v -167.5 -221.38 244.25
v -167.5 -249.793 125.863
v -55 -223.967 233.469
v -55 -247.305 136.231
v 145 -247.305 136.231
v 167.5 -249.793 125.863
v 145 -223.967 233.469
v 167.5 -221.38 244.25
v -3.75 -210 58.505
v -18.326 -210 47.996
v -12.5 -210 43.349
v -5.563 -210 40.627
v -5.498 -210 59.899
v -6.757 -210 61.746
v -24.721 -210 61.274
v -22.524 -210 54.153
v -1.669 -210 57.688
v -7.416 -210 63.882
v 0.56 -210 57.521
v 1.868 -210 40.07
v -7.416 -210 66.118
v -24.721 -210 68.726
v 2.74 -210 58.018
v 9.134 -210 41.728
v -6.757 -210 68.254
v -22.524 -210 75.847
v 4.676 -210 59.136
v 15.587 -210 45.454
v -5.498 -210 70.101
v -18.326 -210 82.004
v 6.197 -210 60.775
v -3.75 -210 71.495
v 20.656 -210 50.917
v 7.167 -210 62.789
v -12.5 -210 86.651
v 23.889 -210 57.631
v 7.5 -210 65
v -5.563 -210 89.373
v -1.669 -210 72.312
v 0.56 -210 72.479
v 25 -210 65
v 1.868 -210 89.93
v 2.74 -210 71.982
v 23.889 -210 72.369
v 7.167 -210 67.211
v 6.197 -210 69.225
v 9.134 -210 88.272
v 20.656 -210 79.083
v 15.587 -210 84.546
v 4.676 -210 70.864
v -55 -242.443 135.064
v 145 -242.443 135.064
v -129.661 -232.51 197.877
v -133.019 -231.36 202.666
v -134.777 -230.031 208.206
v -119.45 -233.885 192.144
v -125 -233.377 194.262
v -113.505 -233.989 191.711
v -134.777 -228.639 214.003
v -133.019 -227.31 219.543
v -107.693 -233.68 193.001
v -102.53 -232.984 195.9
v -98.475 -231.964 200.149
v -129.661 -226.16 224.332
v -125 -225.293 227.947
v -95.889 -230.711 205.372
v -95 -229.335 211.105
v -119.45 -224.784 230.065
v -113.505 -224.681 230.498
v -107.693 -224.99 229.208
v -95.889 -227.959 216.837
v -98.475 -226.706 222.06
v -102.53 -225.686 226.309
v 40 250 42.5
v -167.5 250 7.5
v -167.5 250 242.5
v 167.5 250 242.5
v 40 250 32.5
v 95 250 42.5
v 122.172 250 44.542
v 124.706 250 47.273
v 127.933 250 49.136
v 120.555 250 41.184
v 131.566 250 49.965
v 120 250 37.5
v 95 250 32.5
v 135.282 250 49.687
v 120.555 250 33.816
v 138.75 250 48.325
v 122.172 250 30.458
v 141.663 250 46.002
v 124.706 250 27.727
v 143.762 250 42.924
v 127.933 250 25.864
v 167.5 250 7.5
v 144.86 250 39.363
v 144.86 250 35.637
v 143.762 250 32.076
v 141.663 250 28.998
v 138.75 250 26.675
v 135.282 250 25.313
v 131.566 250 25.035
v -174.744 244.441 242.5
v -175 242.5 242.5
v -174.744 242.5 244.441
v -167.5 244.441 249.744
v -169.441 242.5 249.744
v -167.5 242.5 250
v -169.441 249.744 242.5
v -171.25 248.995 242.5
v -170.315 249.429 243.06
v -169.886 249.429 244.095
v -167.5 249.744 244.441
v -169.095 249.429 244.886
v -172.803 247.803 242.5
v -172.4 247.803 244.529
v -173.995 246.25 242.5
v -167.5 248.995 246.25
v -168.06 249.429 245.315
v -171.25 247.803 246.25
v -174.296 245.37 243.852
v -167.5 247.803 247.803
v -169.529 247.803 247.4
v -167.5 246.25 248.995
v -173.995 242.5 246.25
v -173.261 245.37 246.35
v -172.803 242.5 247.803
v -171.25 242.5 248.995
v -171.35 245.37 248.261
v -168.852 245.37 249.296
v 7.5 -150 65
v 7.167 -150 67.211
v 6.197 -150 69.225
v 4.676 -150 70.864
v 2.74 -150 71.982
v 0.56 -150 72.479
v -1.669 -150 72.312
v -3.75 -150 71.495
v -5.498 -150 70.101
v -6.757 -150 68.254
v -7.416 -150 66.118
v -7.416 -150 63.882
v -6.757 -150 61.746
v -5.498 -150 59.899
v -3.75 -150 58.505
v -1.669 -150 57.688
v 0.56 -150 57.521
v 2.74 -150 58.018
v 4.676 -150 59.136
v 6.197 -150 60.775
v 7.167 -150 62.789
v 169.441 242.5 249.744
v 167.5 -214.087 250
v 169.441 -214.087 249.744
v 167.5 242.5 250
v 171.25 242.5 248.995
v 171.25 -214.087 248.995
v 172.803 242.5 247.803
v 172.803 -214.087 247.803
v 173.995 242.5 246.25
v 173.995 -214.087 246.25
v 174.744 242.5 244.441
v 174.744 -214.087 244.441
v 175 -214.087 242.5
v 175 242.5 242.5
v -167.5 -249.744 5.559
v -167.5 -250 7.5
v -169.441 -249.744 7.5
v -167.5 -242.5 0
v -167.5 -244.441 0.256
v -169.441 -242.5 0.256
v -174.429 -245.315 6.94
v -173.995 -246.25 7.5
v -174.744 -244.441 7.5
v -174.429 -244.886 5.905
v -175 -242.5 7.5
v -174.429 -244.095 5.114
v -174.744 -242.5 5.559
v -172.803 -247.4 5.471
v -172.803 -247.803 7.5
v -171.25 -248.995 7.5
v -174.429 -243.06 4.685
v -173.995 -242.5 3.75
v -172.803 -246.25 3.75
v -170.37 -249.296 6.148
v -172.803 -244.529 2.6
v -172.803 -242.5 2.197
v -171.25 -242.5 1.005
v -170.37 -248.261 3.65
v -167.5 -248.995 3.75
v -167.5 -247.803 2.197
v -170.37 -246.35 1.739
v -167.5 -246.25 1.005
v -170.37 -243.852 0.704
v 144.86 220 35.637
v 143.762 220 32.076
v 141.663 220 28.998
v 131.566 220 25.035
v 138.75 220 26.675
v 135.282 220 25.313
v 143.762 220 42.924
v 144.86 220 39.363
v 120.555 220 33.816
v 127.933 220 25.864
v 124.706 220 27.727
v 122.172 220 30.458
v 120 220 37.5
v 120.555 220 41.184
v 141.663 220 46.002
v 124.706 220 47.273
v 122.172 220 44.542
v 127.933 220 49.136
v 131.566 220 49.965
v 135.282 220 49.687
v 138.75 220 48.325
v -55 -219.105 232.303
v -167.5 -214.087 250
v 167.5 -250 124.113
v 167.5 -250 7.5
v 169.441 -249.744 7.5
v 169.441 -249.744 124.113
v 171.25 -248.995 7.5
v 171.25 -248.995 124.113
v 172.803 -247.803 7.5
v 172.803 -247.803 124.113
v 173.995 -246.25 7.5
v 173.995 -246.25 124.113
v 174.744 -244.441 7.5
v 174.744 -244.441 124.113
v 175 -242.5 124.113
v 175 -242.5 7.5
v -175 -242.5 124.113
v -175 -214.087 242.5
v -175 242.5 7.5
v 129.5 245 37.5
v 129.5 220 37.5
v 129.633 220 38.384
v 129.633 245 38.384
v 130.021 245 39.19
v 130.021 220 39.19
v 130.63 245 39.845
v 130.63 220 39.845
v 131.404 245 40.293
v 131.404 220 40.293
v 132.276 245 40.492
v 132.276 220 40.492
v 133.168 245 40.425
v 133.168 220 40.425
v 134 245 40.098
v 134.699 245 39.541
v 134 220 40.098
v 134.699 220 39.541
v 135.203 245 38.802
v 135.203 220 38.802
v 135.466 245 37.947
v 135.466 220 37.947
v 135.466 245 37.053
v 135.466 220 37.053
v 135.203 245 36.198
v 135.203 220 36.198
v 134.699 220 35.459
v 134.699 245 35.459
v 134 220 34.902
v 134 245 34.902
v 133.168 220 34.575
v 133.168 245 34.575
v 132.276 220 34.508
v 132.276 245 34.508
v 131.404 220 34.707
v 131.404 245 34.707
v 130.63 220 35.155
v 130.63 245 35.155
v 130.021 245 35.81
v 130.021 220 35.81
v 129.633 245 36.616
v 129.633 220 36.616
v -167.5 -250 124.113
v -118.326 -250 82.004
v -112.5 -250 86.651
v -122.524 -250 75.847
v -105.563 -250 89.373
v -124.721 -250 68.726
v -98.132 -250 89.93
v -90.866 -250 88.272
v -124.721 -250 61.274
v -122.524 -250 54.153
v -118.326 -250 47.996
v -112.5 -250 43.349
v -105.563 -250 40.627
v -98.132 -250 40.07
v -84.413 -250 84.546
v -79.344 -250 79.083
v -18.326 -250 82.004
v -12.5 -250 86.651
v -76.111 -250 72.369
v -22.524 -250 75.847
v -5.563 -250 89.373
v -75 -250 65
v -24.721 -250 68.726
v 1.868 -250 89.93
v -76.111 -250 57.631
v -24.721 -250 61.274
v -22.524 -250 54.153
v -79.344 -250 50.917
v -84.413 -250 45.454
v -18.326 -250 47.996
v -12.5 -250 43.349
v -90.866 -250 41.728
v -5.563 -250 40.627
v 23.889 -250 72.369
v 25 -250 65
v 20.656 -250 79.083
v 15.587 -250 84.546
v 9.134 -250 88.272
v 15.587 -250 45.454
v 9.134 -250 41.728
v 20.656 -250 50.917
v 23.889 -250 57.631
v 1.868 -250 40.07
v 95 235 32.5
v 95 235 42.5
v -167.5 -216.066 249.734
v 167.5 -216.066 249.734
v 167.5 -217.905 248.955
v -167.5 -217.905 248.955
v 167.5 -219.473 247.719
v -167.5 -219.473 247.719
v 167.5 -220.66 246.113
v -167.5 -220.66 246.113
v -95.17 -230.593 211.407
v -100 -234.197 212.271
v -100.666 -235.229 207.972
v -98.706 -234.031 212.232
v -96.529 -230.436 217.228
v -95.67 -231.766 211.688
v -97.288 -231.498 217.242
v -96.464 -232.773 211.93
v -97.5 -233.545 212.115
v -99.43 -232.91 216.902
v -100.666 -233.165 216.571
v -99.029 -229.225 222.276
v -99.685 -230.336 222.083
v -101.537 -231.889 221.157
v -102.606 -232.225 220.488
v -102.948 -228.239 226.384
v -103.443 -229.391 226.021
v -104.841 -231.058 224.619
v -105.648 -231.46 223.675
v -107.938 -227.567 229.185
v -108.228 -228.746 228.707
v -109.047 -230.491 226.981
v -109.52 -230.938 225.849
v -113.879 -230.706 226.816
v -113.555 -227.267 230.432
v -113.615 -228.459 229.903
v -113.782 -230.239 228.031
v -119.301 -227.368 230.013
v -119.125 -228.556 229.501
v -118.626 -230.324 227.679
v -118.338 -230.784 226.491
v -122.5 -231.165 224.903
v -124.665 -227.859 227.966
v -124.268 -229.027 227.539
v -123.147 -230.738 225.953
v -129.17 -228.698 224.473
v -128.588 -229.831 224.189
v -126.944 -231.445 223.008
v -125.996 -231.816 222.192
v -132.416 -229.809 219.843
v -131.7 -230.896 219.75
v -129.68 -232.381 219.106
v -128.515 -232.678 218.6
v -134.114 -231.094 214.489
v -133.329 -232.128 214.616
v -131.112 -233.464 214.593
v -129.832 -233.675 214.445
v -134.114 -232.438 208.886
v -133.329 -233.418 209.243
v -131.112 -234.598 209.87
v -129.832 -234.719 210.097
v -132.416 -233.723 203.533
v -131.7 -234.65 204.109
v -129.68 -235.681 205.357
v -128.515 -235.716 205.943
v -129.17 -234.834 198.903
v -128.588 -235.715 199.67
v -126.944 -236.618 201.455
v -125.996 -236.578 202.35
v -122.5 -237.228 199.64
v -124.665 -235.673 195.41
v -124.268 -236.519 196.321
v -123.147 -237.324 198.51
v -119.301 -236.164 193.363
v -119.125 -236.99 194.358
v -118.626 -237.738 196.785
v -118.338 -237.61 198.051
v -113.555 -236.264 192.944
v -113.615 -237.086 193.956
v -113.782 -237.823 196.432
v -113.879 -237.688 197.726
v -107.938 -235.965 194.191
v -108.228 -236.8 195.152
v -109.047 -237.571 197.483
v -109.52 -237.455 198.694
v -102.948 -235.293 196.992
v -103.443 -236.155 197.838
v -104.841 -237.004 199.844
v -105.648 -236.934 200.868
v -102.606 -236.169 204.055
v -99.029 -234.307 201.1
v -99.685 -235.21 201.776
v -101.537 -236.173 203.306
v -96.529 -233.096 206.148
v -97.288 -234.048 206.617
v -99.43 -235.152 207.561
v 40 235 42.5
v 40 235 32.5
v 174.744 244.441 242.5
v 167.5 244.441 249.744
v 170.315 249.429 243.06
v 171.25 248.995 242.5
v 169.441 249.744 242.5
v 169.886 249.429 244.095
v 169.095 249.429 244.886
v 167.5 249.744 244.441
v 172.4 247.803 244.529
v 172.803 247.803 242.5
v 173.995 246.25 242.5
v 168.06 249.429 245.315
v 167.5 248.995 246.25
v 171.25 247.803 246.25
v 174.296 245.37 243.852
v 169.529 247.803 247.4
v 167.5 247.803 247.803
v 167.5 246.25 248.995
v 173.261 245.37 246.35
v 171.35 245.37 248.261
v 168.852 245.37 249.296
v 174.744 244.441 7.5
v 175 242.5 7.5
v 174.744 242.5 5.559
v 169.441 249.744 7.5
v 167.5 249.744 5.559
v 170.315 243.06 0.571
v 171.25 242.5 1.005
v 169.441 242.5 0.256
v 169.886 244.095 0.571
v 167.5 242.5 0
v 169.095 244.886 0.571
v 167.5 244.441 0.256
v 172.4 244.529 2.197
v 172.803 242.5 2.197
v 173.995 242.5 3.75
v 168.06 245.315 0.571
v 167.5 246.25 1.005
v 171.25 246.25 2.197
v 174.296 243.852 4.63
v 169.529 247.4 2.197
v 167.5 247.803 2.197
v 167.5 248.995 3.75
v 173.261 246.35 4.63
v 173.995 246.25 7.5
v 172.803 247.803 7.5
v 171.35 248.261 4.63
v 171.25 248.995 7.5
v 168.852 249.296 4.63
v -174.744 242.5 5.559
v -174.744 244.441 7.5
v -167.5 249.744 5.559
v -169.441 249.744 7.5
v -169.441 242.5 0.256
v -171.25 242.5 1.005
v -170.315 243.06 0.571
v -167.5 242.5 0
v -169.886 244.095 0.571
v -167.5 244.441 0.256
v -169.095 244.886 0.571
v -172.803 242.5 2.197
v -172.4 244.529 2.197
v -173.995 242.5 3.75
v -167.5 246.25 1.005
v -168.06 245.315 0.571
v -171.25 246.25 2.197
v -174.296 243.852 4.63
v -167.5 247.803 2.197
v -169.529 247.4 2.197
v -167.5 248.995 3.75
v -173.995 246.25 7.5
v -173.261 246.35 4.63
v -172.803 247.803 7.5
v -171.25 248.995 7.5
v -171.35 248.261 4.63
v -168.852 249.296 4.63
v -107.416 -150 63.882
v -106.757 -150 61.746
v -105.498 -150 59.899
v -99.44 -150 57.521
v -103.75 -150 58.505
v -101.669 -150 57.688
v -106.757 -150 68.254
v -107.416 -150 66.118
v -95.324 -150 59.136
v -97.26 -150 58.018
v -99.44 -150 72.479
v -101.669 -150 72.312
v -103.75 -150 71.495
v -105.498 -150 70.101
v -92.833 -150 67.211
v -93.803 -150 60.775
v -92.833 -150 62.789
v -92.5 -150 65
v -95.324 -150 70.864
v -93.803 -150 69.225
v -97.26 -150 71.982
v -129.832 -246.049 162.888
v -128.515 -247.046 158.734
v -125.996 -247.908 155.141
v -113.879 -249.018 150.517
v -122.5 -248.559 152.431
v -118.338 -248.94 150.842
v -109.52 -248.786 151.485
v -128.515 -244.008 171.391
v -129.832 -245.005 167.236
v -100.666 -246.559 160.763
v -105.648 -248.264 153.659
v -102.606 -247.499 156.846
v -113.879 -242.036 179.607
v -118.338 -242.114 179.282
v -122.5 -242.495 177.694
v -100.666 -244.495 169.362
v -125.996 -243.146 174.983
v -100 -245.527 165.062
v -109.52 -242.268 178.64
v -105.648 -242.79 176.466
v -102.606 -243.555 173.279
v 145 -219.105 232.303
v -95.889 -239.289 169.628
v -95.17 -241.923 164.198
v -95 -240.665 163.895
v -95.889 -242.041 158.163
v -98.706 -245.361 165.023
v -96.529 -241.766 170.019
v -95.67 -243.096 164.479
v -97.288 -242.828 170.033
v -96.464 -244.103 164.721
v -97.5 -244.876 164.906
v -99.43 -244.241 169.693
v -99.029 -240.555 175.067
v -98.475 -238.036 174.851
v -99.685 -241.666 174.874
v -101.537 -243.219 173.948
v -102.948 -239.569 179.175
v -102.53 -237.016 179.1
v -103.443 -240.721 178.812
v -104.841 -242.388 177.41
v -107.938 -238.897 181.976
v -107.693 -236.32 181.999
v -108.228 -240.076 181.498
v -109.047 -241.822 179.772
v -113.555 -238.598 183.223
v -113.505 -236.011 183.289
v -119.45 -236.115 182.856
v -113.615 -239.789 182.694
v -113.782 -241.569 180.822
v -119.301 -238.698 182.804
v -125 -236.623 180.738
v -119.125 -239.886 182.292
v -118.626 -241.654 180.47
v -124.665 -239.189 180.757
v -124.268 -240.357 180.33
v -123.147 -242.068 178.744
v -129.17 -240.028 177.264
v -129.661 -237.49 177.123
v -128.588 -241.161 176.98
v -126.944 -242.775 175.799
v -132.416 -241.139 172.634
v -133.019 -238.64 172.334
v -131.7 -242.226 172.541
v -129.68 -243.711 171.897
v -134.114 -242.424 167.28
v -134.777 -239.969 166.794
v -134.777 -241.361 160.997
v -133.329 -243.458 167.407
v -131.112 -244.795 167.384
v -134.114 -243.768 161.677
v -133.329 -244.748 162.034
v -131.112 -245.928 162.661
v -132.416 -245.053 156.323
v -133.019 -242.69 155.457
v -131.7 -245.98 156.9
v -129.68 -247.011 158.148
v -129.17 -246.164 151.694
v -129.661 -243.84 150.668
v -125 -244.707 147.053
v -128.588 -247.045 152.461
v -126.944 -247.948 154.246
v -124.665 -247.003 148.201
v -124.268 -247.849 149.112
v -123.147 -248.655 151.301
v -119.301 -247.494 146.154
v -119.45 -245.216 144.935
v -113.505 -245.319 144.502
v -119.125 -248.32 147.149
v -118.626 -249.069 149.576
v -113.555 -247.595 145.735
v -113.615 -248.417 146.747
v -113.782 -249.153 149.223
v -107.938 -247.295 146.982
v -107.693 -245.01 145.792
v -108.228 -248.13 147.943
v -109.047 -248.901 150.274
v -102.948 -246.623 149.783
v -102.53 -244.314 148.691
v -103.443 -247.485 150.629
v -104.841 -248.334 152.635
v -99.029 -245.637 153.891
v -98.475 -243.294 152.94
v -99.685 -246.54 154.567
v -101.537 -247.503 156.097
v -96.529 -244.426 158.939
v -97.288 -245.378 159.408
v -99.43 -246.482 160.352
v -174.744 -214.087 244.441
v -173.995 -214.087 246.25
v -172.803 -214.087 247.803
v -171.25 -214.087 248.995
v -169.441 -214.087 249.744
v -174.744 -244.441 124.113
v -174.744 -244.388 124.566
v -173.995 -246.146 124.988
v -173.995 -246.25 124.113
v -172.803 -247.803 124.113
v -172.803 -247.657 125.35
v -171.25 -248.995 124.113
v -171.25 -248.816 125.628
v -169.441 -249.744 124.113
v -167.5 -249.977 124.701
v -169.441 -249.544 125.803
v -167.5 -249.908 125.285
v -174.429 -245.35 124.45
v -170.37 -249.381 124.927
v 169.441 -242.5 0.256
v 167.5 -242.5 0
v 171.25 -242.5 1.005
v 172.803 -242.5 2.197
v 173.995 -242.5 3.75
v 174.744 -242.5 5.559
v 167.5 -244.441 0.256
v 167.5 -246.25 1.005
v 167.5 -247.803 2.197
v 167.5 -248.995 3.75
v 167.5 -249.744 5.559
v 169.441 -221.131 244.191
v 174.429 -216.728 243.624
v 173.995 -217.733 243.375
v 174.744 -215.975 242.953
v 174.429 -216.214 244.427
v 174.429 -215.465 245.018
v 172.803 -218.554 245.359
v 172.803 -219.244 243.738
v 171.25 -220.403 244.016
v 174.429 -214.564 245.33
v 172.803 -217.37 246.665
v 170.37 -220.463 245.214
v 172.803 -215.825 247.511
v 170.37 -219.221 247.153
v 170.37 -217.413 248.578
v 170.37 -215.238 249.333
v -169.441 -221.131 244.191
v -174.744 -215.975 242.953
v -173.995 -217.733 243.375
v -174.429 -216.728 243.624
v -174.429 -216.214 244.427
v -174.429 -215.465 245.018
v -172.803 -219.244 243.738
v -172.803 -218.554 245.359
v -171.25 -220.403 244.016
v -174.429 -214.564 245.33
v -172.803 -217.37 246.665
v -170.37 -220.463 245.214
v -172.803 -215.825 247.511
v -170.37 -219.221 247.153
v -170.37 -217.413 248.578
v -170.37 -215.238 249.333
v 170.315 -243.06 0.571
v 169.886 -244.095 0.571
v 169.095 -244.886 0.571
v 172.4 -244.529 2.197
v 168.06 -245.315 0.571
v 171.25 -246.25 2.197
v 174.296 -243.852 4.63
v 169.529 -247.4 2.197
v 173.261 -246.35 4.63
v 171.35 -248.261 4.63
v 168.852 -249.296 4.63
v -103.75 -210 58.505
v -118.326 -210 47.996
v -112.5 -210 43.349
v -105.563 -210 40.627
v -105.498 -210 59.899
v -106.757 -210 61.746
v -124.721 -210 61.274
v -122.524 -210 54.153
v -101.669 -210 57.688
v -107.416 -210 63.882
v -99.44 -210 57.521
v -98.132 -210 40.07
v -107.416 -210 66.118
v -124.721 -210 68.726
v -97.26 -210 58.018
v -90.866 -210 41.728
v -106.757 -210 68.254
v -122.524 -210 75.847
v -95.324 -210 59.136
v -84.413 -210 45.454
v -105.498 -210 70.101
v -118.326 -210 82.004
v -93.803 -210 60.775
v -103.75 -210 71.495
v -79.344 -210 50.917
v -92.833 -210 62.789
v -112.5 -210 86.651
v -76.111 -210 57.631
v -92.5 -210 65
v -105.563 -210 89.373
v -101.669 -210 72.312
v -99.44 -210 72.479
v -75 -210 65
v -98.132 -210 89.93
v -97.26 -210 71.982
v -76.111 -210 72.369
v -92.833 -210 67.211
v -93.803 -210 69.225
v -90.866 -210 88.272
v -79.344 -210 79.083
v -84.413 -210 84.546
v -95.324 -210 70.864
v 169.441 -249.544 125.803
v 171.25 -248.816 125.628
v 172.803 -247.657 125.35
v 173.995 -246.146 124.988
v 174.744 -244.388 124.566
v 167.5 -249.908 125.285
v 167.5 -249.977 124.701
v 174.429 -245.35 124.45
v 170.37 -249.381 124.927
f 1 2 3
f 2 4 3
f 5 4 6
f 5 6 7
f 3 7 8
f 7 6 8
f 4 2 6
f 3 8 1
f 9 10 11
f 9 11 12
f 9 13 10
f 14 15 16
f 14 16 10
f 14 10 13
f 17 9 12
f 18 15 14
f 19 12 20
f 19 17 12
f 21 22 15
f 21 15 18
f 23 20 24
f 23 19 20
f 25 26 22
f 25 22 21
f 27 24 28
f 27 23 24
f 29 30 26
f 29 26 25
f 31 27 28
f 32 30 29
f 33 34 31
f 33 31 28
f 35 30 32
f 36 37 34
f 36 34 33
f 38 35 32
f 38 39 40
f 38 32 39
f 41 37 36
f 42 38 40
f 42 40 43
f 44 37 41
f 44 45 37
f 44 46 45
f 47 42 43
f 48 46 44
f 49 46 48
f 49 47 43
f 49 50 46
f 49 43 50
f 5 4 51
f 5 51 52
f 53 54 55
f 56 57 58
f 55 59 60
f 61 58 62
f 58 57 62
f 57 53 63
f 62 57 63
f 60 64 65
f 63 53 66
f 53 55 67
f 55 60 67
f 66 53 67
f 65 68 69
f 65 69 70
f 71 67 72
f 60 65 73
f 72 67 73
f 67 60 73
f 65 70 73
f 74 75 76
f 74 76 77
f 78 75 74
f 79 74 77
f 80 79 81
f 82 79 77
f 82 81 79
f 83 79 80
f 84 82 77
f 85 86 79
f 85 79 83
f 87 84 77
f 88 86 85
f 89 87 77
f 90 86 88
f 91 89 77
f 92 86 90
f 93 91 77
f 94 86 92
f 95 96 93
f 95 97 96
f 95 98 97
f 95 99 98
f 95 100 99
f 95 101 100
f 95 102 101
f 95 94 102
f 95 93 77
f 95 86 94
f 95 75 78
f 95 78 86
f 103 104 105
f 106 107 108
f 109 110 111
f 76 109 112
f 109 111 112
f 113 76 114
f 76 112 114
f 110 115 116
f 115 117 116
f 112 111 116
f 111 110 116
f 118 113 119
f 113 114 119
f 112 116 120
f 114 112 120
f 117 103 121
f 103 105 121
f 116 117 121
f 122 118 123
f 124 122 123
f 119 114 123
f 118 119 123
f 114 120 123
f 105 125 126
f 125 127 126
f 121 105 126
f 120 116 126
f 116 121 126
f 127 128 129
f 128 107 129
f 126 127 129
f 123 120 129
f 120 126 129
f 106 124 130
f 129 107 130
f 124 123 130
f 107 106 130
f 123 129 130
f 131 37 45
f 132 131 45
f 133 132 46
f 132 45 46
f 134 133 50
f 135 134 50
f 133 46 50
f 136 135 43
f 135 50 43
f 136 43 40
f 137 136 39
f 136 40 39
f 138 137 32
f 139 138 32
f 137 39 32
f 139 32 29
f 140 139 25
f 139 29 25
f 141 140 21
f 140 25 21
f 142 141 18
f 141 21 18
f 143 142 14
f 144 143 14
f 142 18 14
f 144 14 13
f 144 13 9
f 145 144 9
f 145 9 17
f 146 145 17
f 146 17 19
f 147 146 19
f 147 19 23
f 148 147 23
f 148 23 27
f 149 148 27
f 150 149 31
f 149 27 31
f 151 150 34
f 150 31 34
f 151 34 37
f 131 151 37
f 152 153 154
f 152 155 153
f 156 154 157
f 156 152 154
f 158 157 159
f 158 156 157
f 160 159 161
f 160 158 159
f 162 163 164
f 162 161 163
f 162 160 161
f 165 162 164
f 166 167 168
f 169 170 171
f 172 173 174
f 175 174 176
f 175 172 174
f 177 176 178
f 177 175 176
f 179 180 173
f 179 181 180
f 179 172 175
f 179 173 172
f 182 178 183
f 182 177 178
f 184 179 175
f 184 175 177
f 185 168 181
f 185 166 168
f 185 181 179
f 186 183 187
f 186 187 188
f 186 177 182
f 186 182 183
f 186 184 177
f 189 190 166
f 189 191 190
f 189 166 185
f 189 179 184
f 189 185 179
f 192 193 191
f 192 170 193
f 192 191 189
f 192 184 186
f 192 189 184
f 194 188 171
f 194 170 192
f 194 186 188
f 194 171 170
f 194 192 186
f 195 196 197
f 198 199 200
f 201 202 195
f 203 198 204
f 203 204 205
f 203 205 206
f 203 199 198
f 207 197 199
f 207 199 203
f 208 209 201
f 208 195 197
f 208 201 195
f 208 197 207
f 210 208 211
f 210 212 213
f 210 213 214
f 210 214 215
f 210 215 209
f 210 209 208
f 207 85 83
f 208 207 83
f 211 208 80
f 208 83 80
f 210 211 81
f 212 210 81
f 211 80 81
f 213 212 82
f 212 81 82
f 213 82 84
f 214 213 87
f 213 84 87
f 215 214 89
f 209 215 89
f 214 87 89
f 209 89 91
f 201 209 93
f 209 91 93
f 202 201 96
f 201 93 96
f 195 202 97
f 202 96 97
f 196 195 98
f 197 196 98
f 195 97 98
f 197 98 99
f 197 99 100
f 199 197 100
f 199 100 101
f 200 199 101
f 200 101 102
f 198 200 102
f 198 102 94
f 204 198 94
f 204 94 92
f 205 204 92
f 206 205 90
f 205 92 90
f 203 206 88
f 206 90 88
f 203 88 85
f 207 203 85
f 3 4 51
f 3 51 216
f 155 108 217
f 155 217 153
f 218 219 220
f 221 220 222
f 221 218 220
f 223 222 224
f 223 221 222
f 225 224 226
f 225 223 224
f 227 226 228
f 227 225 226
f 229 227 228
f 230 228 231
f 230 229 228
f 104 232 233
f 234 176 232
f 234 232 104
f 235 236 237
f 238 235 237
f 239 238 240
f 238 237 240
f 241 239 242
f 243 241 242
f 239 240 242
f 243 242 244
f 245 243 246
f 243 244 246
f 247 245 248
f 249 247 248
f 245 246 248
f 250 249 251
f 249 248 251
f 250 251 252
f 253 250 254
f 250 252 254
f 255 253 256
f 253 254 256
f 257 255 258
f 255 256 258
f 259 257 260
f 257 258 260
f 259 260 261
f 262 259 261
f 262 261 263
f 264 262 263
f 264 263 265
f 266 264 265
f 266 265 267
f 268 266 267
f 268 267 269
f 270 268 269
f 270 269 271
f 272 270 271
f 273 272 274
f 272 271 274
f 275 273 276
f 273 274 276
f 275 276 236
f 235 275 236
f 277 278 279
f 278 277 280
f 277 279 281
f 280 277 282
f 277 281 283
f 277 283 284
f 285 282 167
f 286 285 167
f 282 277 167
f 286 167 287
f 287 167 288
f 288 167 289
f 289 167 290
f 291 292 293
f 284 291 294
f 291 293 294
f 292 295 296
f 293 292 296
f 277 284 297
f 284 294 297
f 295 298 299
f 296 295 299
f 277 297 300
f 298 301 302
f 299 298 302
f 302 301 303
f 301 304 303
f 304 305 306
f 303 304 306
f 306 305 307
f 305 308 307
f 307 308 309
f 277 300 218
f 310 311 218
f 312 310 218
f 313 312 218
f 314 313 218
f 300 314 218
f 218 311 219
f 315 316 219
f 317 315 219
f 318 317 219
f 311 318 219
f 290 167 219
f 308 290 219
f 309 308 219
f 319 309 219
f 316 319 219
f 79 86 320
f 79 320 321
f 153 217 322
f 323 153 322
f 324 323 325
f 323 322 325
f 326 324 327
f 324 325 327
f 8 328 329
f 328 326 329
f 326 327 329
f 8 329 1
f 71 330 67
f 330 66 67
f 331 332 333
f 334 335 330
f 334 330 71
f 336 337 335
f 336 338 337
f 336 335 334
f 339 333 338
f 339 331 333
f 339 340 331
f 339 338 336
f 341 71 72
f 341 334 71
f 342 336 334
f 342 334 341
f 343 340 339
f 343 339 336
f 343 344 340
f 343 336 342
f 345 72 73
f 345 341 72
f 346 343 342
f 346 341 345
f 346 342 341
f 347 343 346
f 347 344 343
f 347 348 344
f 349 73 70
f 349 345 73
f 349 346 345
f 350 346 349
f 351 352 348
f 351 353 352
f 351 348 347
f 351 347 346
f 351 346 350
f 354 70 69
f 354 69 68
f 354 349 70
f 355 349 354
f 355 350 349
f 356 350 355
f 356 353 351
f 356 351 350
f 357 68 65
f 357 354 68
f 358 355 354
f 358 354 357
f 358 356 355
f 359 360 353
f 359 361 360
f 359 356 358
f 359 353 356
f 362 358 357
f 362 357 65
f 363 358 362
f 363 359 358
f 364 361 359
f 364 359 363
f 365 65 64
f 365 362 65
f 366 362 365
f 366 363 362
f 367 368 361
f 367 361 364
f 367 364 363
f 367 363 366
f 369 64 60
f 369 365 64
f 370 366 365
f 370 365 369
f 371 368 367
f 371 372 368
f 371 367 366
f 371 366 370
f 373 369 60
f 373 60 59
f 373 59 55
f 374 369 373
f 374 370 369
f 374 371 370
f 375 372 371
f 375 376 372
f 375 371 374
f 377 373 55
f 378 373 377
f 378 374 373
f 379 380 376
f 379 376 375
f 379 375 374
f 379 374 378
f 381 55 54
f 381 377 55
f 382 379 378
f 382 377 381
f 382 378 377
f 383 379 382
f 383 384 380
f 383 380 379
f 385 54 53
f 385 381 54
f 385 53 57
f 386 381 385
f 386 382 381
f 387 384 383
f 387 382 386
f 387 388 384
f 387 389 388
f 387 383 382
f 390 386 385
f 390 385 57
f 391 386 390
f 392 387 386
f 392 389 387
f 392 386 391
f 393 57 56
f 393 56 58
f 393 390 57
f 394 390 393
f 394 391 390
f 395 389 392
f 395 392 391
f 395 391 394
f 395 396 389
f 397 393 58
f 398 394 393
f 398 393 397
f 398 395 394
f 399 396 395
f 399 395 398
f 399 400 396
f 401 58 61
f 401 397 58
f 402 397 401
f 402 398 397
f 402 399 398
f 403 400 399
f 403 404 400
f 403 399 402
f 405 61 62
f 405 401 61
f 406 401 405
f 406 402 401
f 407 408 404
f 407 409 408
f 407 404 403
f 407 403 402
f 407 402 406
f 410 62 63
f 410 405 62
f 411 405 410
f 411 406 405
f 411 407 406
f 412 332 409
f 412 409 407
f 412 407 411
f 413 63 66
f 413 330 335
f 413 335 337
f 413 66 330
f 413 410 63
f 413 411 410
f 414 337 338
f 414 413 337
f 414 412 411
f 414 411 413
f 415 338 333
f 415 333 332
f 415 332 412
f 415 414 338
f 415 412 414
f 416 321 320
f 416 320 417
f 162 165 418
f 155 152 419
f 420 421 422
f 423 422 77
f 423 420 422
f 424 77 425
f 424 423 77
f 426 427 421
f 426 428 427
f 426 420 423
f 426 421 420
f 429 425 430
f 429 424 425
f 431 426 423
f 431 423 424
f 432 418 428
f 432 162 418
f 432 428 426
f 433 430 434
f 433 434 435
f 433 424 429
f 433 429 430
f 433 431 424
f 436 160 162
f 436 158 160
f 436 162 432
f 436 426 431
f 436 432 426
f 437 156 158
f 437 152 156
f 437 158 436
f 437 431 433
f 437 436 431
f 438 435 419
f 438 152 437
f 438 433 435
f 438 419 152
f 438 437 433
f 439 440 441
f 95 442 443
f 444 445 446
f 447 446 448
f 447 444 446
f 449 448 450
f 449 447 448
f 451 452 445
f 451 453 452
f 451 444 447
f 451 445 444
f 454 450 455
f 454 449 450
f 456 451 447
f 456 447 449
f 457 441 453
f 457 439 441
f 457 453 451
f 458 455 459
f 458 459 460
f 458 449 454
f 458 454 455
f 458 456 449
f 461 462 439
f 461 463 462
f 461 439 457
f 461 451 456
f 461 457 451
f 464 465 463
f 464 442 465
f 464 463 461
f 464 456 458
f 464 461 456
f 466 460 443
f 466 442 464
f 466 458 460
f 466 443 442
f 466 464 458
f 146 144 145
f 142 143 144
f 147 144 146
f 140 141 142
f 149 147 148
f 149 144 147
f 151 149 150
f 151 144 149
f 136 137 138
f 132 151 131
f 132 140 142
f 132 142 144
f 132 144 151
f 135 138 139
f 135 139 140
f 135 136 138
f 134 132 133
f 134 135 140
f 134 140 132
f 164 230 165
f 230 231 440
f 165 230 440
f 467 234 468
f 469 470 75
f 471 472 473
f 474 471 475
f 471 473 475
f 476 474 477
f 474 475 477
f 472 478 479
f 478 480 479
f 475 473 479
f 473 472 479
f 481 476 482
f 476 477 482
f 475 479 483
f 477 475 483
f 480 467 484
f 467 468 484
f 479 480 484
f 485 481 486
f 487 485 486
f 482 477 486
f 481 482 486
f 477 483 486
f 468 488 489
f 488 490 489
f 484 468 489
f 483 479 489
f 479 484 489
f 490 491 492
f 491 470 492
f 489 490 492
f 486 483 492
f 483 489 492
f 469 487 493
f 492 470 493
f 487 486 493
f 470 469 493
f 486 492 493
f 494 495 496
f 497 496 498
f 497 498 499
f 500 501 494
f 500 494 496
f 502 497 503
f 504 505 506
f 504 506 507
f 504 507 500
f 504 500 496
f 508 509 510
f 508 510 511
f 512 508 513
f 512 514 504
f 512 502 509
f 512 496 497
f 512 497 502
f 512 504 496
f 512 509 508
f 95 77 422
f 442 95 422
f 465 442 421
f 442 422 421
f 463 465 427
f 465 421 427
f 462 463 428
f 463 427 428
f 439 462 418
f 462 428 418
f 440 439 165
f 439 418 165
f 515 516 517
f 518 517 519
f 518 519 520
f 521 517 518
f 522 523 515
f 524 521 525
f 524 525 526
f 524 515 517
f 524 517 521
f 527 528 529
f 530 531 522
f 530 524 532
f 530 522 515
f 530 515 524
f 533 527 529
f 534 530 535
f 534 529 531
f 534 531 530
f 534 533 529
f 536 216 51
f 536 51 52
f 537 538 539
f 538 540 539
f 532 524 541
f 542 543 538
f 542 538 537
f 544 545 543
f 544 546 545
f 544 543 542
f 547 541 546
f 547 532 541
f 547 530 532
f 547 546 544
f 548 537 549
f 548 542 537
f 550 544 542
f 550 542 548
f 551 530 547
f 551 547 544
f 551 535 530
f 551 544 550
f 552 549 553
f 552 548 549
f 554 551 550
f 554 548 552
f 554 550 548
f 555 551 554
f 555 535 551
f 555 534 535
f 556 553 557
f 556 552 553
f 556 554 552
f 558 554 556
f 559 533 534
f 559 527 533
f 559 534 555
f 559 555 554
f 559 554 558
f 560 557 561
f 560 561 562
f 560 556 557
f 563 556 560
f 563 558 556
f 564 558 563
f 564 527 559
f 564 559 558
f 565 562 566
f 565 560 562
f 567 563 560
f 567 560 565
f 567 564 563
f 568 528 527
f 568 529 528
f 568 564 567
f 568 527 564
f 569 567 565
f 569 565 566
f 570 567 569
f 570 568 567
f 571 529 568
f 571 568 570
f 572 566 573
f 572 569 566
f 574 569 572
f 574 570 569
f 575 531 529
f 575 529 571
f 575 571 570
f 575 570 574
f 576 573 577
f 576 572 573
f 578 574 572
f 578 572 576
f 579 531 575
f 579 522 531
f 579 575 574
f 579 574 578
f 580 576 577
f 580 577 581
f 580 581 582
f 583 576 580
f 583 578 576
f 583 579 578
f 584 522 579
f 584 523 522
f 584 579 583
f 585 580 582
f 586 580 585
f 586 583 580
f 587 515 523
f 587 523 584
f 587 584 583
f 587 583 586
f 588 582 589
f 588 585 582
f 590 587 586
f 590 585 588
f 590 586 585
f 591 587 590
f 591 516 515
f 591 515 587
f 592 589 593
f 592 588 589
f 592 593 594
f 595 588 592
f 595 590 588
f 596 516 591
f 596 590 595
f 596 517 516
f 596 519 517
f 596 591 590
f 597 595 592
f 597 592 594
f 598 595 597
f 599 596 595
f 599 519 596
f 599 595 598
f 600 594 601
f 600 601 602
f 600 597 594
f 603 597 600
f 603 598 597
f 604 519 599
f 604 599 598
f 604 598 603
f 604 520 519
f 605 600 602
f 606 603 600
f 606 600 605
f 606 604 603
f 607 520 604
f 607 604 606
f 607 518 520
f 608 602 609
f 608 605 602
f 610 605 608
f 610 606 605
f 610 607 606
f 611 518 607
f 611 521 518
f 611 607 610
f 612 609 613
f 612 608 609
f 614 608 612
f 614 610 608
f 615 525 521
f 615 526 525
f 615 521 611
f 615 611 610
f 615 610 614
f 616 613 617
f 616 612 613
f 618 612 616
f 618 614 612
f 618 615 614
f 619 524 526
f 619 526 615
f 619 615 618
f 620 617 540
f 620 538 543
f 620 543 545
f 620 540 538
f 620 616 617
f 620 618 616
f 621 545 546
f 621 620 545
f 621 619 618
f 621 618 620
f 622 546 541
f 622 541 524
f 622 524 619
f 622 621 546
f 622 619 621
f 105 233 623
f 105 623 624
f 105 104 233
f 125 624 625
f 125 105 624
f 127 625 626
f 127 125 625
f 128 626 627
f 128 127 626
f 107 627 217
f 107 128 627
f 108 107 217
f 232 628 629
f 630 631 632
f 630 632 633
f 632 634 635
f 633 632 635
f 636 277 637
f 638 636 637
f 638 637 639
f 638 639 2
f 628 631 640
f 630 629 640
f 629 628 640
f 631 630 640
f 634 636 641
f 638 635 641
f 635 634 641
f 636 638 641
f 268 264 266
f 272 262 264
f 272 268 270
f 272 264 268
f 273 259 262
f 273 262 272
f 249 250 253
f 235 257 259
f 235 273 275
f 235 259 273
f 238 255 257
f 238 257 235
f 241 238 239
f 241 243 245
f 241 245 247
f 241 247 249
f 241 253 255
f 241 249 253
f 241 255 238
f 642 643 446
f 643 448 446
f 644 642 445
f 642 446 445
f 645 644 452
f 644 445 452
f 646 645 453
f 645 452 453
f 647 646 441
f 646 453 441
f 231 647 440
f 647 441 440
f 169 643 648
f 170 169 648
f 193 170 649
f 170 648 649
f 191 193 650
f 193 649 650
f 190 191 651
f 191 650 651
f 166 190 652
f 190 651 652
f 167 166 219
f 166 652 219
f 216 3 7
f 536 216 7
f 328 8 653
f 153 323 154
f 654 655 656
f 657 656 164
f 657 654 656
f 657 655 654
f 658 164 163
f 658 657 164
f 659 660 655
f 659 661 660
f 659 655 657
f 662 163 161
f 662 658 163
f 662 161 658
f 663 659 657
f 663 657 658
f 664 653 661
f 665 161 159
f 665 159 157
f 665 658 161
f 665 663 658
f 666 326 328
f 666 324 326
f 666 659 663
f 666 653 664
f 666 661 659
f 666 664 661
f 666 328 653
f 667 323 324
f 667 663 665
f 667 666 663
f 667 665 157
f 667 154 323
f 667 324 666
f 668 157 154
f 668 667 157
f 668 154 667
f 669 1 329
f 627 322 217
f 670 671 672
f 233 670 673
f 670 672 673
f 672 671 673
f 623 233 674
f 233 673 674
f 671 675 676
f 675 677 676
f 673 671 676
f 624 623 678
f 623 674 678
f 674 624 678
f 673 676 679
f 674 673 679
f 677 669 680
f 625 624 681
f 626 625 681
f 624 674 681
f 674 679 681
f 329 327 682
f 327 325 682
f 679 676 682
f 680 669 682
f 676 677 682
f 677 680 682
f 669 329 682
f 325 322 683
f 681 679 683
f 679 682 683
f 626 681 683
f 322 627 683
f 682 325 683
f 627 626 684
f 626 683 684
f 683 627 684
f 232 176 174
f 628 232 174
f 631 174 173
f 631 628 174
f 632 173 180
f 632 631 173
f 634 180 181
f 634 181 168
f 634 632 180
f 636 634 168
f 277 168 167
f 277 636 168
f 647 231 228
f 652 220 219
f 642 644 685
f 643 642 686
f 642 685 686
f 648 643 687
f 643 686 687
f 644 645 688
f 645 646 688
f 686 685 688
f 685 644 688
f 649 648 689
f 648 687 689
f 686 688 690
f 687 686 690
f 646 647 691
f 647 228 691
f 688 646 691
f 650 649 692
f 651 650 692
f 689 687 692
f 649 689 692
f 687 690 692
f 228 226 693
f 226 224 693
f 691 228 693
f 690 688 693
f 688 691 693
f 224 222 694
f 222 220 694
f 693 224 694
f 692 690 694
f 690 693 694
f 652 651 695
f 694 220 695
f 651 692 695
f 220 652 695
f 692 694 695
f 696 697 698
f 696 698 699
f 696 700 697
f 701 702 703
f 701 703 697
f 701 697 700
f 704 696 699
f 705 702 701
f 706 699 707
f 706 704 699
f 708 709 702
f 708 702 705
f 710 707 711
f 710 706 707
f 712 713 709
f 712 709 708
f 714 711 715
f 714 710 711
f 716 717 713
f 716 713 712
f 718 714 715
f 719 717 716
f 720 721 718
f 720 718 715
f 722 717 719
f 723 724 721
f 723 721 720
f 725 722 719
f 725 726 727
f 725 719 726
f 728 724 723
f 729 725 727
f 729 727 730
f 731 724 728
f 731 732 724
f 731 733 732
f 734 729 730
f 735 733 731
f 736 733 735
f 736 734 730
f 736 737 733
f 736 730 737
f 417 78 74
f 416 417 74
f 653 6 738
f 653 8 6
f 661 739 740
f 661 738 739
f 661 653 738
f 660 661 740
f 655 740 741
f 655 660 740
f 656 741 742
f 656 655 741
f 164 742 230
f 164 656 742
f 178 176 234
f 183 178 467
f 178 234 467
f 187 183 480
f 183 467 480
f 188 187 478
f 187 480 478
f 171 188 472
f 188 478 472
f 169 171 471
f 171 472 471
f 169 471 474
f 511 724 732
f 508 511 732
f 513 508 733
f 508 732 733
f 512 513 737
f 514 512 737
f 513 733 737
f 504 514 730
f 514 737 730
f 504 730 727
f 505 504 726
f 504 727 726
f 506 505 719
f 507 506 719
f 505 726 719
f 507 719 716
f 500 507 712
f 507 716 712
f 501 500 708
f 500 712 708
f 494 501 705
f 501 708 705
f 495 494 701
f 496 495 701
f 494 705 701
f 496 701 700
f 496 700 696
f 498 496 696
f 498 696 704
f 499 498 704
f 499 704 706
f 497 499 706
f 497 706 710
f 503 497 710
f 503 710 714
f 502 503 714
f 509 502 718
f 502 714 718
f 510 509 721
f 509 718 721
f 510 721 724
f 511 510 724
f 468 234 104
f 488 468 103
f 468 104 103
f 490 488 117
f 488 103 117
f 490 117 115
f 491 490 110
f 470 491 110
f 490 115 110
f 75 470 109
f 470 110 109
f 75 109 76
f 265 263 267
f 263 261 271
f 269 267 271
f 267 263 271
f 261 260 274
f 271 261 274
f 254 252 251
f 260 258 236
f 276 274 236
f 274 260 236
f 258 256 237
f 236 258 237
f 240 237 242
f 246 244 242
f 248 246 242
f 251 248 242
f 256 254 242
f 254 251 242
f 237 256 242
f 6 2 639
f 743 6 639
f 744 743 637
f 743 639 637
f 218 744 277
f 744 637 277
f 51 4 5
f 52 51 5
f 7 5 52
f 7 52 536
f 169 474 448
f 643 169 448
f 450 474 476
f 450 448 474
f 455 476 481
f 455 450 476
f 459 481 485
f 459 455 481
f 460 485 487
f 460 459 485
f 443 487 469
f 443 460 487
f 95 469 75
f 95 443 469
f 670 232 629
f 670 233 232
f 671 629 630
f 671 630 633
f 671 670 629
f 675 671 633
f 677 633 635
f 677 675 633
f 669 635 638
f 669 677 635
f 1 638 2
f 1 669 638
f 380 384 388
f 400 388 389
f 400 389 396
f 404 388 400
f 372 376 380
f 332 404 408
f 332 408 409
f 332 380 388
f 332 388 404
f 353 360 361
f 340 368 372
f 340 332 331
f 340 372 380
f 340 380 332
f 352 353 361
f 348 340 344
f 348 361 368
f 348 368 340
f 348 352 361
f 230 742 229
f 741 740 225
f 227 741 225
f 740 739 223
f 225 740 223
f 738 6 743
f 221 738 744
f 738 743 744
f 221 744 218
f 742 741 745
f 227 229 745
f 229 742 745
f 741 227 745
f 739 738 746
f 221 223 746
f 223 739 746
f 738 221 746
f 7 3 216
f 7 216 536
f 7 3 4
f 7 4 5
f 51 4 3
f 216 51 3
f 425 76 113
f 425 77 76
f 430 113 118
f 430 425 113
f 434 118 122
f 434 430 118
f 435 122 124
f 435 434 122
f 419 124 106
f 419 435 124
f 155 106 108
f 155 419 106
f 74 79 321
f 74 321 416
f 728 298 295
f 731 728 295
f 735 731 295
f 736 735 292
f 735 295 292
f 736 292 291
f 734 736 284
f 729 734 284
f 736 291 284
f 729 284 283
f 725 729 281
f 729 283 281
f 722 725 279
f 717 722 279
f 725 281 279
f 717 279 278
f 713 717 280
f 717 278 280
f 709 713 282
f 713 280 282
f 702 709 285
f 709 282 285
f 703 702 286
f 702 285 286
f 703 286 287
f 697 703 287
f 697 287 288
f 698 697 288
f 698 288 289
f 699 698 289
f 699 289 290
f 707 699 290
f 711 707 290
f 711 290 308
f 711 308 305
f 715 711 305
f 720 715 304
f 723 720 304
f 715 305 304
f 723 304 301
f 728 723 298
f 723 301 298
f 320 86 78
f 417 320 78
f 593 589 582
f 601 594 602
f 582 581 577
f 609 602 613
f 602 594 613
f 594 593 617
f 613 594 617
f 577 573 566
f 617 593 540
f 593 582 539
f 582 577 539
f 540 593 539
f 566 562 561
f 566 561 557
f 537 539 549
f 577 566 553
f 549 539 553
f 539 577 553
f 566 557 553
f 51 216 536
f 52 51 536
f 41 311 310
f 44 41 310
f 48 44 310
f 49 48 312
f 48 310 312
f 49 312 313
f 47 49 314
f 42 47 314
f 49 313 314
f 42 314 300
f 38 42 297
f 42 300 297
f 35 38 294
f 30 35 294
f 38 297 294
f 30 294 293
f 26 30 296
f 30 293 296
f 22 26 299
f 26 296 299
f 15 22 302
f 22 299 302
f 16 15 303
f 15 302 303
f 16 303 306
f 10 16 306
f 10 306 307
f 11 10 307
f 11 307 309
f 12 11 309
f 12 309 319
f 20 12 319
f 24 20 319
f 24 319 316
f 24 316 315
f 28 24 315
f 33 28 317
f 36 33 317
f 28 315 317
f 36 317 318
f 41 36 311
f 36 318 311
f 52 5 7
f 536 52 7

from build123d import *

# Parameters (mm, degrees)
F0_W      = 350
F0_H      = 500
F1_DEPTH  = 250
F3_DEPTH  = 350
F4_R      = 20
F5_DEPTH  = 5
F6_R      = 4.99999
F7_R      = 20
F8_DEPTH  = 5
F9_R      = 4.99999
F10_W     = 200
F10_H     = 100
F11_DEPTH = 5
F12_W     = 200
F12_H     = 100
F13_DEPTH = 5
F14_R     = 25
F15_DEPTH = 40
F16_R     = 7.5
F17_DEPTH = 60
F18_R     = 25
F19_DEPTH = 40
F20_R     = 7.5
F21_DEPTH = 60
F22_R     = 7.5
F23_R     = 12.5
F24_DEPTH = 30
F25_R     = 3
F26_DEPTH = 25
F27_W     = 55
F27_H     = 10
F28_DEPTH = 15


# Not quite as in the source:
# - a fillet or chamfer is up to 0.001 mm smaller than in the source, because OpenCascade refuses the exact size


with BuildPart() as f1:
    # F0 (on Top) → F1 (new body)
    with BuildSketch(Plane.XY):
        Rectangle(F0_W, F0_H)
    extrude(amount=F1_DEPTH)

    # F2 (on face) → F3 (cut)
    with BuildSketch(Plane.YZ.offset(175)):
        Polygon((-220, 250), (-250, 250), (-250, 125), align=None)
    extrude(amount=-F3_DEPTH, mode=Mode.SUBTRACT)

    # F10 (on face) → F11 (cut)
    with BuildSketch(Plane(origin=(0, -264.7503782148, 63.5400907716), x_dir=(1, 0, 0), z_dir=(0, -0.972387302, 0.2333729525))):
        with Locations((45, 124.7547759506)):
            Rectangle(F10_W, F10_H)
    extrude(amount=-F11_DEPTH, mode=Mode.SUBTRACT)

    # F14 (on face) → F15 (cut)
    with BuildSketch(Plane.XZ.offset(250)):
        with Locations((0, 65)):
            Circle(F14_R)
    extrude(amount=-F15_DEPTH, mode=Mode.SUBTRACT)

    # F16 (on face) → F17 (cut)
    with BuildSketch(Plane.XZ.offset(210)):
        with Locations((0, 65)):
            Circle(F16_R)
    extrude(amount=-F17_DEPTH, mode=Mode.SUBTRACT)

    # F18 (on face) → F19 (cut)
    with BuildSketch(Plane.XZ.offset(250)):
        with Locations((-100, 65)):
            Circle(F18_R)
    extrude(amount=-F19_DEPTH, mode=Mode.SUBTRACT)

    # F20 (on face) → F21 (cut)
    with BuildSketch(Plane.XZ.offset(210)):
        with Locations((-100, 65)):
            Circle(F20_R)
    extrude(amount=-F21_DEPTH, mode=Mode.SUBTRACT)

    # F22
    f22_edges = [f1.edges().sort_by_distance(p)[0] for p in [
        (175, -235, 187.5),
        (175, -250, 62.5),
        (0, -250, 125),
        (175, 15, 250),
        (175, 250, 125),
        (175, 0, 0),
        (0, -250, 0),
        (-175, -250, 62.5),
        (-175, -235, 187.5),
        (-175, 15, 250),
        (-175, 250, 125),
        (-175, 0, 0),
        (0, 250, 0),
        (0, 250, 250),
        (0, -220, 250),
    ]]
    fillet(f22_edges, radius=F22_R)

    # F23 (on face) → F24 (cut)
    with BuildSketch(Plane(origin=(0, 250, 0), x_dir=(-1, 0, 0), z_dir=(0, 1, 0))):
        with Locations((-132.5, 37.5)):
            Circle(F23_R)
    extrude(amount=-F24_DEPTH, mode=Mode.SUBTRACT)

    # F27 (on face) → F28 (cut)
    with BuildSketch(Plane(origin=(0, 250, 0), x_dir=(-1, 0, 0), z_dir=(0, 1, 0))):
        with Locations((-67.5, 37.5)):
            Rectangle(F27_W, F27_H)
    extrude(amount=-F28_DEPTH, mode=Mode.SUBTRACT)


with BuildPart() as f5:
    # F4 (on face) → F5 (new body)
    with BuildSketch(Plane(origin=(0, -264.7503782148, 63.5400907716), x_dir=(1, 0, 0), z_dir=(0, -0.972387302, 0.2333729525))):
        with Locations((-115, 151.7547759506)):
            Circle(F4_R)
    extrude(amount=F5_DEPTH)

    # F6 (radius 5 in the source; OpenCascade refuses exactly that, so slightly less here)
    f6_edges = [f5.edges().sort_by_distance(p)[0] for p in [
        (-135, -234.196855, 212.271373),
    ]]
    fillet(f6_edges, radius=F6_R)


with BuildPart() as f8:
    # F7 (on face) → F8 (new body)
    with BuildSketch(Plane(origin=(0, -264.7503782148, 63.5400907716), x_dir=(1, 0, 0), z_dir=(0, -0.972387302, 0.2333729525))):
        with Locations((-115, 103.2051746287)):
            Circle(F7_R)
    extrude(amount=F8_DEPTH)

    # F9 (radius 5 in the source; OpenCascade refuses exactly that, so slightly less here)
    f9_edges = [f8.edges().sort_by_distance(p)[0] for p in [
        (-135, -245.527018, 165.062357),
    ]]
    fillet(f9_edges, radius=F9_R)


with BuildPart() as f13:
    # F12 (on face) → F13 (new body)
    with BuildSketch(Plane(origin=(0, -264.7503782148, 63.5400907716), x_dir=(1, 0, 0), z_dir=(0, -0.972387302, 0.2333729525))):
        with Locations((45, 124.7547759506)):
            Rectangle(F12_W, F12_H)
    extrude(amount=-F13_DEPTH)


with BuildPart() as f26:
    # F25 (on face) → F26 (new body)
    with BuildSketch(Plane(origin=(0, 220, 0), x_dir=(-1, 0, 0), z_dir=(0, 1, 0))):
        with Locations((-132.5, 37.5)):
            Circle(F25_R)
    extrude(amount=F26_DEPTH)


solid = Compound([f1.part, f5.part, f8.part, f13.part, f26.part])
